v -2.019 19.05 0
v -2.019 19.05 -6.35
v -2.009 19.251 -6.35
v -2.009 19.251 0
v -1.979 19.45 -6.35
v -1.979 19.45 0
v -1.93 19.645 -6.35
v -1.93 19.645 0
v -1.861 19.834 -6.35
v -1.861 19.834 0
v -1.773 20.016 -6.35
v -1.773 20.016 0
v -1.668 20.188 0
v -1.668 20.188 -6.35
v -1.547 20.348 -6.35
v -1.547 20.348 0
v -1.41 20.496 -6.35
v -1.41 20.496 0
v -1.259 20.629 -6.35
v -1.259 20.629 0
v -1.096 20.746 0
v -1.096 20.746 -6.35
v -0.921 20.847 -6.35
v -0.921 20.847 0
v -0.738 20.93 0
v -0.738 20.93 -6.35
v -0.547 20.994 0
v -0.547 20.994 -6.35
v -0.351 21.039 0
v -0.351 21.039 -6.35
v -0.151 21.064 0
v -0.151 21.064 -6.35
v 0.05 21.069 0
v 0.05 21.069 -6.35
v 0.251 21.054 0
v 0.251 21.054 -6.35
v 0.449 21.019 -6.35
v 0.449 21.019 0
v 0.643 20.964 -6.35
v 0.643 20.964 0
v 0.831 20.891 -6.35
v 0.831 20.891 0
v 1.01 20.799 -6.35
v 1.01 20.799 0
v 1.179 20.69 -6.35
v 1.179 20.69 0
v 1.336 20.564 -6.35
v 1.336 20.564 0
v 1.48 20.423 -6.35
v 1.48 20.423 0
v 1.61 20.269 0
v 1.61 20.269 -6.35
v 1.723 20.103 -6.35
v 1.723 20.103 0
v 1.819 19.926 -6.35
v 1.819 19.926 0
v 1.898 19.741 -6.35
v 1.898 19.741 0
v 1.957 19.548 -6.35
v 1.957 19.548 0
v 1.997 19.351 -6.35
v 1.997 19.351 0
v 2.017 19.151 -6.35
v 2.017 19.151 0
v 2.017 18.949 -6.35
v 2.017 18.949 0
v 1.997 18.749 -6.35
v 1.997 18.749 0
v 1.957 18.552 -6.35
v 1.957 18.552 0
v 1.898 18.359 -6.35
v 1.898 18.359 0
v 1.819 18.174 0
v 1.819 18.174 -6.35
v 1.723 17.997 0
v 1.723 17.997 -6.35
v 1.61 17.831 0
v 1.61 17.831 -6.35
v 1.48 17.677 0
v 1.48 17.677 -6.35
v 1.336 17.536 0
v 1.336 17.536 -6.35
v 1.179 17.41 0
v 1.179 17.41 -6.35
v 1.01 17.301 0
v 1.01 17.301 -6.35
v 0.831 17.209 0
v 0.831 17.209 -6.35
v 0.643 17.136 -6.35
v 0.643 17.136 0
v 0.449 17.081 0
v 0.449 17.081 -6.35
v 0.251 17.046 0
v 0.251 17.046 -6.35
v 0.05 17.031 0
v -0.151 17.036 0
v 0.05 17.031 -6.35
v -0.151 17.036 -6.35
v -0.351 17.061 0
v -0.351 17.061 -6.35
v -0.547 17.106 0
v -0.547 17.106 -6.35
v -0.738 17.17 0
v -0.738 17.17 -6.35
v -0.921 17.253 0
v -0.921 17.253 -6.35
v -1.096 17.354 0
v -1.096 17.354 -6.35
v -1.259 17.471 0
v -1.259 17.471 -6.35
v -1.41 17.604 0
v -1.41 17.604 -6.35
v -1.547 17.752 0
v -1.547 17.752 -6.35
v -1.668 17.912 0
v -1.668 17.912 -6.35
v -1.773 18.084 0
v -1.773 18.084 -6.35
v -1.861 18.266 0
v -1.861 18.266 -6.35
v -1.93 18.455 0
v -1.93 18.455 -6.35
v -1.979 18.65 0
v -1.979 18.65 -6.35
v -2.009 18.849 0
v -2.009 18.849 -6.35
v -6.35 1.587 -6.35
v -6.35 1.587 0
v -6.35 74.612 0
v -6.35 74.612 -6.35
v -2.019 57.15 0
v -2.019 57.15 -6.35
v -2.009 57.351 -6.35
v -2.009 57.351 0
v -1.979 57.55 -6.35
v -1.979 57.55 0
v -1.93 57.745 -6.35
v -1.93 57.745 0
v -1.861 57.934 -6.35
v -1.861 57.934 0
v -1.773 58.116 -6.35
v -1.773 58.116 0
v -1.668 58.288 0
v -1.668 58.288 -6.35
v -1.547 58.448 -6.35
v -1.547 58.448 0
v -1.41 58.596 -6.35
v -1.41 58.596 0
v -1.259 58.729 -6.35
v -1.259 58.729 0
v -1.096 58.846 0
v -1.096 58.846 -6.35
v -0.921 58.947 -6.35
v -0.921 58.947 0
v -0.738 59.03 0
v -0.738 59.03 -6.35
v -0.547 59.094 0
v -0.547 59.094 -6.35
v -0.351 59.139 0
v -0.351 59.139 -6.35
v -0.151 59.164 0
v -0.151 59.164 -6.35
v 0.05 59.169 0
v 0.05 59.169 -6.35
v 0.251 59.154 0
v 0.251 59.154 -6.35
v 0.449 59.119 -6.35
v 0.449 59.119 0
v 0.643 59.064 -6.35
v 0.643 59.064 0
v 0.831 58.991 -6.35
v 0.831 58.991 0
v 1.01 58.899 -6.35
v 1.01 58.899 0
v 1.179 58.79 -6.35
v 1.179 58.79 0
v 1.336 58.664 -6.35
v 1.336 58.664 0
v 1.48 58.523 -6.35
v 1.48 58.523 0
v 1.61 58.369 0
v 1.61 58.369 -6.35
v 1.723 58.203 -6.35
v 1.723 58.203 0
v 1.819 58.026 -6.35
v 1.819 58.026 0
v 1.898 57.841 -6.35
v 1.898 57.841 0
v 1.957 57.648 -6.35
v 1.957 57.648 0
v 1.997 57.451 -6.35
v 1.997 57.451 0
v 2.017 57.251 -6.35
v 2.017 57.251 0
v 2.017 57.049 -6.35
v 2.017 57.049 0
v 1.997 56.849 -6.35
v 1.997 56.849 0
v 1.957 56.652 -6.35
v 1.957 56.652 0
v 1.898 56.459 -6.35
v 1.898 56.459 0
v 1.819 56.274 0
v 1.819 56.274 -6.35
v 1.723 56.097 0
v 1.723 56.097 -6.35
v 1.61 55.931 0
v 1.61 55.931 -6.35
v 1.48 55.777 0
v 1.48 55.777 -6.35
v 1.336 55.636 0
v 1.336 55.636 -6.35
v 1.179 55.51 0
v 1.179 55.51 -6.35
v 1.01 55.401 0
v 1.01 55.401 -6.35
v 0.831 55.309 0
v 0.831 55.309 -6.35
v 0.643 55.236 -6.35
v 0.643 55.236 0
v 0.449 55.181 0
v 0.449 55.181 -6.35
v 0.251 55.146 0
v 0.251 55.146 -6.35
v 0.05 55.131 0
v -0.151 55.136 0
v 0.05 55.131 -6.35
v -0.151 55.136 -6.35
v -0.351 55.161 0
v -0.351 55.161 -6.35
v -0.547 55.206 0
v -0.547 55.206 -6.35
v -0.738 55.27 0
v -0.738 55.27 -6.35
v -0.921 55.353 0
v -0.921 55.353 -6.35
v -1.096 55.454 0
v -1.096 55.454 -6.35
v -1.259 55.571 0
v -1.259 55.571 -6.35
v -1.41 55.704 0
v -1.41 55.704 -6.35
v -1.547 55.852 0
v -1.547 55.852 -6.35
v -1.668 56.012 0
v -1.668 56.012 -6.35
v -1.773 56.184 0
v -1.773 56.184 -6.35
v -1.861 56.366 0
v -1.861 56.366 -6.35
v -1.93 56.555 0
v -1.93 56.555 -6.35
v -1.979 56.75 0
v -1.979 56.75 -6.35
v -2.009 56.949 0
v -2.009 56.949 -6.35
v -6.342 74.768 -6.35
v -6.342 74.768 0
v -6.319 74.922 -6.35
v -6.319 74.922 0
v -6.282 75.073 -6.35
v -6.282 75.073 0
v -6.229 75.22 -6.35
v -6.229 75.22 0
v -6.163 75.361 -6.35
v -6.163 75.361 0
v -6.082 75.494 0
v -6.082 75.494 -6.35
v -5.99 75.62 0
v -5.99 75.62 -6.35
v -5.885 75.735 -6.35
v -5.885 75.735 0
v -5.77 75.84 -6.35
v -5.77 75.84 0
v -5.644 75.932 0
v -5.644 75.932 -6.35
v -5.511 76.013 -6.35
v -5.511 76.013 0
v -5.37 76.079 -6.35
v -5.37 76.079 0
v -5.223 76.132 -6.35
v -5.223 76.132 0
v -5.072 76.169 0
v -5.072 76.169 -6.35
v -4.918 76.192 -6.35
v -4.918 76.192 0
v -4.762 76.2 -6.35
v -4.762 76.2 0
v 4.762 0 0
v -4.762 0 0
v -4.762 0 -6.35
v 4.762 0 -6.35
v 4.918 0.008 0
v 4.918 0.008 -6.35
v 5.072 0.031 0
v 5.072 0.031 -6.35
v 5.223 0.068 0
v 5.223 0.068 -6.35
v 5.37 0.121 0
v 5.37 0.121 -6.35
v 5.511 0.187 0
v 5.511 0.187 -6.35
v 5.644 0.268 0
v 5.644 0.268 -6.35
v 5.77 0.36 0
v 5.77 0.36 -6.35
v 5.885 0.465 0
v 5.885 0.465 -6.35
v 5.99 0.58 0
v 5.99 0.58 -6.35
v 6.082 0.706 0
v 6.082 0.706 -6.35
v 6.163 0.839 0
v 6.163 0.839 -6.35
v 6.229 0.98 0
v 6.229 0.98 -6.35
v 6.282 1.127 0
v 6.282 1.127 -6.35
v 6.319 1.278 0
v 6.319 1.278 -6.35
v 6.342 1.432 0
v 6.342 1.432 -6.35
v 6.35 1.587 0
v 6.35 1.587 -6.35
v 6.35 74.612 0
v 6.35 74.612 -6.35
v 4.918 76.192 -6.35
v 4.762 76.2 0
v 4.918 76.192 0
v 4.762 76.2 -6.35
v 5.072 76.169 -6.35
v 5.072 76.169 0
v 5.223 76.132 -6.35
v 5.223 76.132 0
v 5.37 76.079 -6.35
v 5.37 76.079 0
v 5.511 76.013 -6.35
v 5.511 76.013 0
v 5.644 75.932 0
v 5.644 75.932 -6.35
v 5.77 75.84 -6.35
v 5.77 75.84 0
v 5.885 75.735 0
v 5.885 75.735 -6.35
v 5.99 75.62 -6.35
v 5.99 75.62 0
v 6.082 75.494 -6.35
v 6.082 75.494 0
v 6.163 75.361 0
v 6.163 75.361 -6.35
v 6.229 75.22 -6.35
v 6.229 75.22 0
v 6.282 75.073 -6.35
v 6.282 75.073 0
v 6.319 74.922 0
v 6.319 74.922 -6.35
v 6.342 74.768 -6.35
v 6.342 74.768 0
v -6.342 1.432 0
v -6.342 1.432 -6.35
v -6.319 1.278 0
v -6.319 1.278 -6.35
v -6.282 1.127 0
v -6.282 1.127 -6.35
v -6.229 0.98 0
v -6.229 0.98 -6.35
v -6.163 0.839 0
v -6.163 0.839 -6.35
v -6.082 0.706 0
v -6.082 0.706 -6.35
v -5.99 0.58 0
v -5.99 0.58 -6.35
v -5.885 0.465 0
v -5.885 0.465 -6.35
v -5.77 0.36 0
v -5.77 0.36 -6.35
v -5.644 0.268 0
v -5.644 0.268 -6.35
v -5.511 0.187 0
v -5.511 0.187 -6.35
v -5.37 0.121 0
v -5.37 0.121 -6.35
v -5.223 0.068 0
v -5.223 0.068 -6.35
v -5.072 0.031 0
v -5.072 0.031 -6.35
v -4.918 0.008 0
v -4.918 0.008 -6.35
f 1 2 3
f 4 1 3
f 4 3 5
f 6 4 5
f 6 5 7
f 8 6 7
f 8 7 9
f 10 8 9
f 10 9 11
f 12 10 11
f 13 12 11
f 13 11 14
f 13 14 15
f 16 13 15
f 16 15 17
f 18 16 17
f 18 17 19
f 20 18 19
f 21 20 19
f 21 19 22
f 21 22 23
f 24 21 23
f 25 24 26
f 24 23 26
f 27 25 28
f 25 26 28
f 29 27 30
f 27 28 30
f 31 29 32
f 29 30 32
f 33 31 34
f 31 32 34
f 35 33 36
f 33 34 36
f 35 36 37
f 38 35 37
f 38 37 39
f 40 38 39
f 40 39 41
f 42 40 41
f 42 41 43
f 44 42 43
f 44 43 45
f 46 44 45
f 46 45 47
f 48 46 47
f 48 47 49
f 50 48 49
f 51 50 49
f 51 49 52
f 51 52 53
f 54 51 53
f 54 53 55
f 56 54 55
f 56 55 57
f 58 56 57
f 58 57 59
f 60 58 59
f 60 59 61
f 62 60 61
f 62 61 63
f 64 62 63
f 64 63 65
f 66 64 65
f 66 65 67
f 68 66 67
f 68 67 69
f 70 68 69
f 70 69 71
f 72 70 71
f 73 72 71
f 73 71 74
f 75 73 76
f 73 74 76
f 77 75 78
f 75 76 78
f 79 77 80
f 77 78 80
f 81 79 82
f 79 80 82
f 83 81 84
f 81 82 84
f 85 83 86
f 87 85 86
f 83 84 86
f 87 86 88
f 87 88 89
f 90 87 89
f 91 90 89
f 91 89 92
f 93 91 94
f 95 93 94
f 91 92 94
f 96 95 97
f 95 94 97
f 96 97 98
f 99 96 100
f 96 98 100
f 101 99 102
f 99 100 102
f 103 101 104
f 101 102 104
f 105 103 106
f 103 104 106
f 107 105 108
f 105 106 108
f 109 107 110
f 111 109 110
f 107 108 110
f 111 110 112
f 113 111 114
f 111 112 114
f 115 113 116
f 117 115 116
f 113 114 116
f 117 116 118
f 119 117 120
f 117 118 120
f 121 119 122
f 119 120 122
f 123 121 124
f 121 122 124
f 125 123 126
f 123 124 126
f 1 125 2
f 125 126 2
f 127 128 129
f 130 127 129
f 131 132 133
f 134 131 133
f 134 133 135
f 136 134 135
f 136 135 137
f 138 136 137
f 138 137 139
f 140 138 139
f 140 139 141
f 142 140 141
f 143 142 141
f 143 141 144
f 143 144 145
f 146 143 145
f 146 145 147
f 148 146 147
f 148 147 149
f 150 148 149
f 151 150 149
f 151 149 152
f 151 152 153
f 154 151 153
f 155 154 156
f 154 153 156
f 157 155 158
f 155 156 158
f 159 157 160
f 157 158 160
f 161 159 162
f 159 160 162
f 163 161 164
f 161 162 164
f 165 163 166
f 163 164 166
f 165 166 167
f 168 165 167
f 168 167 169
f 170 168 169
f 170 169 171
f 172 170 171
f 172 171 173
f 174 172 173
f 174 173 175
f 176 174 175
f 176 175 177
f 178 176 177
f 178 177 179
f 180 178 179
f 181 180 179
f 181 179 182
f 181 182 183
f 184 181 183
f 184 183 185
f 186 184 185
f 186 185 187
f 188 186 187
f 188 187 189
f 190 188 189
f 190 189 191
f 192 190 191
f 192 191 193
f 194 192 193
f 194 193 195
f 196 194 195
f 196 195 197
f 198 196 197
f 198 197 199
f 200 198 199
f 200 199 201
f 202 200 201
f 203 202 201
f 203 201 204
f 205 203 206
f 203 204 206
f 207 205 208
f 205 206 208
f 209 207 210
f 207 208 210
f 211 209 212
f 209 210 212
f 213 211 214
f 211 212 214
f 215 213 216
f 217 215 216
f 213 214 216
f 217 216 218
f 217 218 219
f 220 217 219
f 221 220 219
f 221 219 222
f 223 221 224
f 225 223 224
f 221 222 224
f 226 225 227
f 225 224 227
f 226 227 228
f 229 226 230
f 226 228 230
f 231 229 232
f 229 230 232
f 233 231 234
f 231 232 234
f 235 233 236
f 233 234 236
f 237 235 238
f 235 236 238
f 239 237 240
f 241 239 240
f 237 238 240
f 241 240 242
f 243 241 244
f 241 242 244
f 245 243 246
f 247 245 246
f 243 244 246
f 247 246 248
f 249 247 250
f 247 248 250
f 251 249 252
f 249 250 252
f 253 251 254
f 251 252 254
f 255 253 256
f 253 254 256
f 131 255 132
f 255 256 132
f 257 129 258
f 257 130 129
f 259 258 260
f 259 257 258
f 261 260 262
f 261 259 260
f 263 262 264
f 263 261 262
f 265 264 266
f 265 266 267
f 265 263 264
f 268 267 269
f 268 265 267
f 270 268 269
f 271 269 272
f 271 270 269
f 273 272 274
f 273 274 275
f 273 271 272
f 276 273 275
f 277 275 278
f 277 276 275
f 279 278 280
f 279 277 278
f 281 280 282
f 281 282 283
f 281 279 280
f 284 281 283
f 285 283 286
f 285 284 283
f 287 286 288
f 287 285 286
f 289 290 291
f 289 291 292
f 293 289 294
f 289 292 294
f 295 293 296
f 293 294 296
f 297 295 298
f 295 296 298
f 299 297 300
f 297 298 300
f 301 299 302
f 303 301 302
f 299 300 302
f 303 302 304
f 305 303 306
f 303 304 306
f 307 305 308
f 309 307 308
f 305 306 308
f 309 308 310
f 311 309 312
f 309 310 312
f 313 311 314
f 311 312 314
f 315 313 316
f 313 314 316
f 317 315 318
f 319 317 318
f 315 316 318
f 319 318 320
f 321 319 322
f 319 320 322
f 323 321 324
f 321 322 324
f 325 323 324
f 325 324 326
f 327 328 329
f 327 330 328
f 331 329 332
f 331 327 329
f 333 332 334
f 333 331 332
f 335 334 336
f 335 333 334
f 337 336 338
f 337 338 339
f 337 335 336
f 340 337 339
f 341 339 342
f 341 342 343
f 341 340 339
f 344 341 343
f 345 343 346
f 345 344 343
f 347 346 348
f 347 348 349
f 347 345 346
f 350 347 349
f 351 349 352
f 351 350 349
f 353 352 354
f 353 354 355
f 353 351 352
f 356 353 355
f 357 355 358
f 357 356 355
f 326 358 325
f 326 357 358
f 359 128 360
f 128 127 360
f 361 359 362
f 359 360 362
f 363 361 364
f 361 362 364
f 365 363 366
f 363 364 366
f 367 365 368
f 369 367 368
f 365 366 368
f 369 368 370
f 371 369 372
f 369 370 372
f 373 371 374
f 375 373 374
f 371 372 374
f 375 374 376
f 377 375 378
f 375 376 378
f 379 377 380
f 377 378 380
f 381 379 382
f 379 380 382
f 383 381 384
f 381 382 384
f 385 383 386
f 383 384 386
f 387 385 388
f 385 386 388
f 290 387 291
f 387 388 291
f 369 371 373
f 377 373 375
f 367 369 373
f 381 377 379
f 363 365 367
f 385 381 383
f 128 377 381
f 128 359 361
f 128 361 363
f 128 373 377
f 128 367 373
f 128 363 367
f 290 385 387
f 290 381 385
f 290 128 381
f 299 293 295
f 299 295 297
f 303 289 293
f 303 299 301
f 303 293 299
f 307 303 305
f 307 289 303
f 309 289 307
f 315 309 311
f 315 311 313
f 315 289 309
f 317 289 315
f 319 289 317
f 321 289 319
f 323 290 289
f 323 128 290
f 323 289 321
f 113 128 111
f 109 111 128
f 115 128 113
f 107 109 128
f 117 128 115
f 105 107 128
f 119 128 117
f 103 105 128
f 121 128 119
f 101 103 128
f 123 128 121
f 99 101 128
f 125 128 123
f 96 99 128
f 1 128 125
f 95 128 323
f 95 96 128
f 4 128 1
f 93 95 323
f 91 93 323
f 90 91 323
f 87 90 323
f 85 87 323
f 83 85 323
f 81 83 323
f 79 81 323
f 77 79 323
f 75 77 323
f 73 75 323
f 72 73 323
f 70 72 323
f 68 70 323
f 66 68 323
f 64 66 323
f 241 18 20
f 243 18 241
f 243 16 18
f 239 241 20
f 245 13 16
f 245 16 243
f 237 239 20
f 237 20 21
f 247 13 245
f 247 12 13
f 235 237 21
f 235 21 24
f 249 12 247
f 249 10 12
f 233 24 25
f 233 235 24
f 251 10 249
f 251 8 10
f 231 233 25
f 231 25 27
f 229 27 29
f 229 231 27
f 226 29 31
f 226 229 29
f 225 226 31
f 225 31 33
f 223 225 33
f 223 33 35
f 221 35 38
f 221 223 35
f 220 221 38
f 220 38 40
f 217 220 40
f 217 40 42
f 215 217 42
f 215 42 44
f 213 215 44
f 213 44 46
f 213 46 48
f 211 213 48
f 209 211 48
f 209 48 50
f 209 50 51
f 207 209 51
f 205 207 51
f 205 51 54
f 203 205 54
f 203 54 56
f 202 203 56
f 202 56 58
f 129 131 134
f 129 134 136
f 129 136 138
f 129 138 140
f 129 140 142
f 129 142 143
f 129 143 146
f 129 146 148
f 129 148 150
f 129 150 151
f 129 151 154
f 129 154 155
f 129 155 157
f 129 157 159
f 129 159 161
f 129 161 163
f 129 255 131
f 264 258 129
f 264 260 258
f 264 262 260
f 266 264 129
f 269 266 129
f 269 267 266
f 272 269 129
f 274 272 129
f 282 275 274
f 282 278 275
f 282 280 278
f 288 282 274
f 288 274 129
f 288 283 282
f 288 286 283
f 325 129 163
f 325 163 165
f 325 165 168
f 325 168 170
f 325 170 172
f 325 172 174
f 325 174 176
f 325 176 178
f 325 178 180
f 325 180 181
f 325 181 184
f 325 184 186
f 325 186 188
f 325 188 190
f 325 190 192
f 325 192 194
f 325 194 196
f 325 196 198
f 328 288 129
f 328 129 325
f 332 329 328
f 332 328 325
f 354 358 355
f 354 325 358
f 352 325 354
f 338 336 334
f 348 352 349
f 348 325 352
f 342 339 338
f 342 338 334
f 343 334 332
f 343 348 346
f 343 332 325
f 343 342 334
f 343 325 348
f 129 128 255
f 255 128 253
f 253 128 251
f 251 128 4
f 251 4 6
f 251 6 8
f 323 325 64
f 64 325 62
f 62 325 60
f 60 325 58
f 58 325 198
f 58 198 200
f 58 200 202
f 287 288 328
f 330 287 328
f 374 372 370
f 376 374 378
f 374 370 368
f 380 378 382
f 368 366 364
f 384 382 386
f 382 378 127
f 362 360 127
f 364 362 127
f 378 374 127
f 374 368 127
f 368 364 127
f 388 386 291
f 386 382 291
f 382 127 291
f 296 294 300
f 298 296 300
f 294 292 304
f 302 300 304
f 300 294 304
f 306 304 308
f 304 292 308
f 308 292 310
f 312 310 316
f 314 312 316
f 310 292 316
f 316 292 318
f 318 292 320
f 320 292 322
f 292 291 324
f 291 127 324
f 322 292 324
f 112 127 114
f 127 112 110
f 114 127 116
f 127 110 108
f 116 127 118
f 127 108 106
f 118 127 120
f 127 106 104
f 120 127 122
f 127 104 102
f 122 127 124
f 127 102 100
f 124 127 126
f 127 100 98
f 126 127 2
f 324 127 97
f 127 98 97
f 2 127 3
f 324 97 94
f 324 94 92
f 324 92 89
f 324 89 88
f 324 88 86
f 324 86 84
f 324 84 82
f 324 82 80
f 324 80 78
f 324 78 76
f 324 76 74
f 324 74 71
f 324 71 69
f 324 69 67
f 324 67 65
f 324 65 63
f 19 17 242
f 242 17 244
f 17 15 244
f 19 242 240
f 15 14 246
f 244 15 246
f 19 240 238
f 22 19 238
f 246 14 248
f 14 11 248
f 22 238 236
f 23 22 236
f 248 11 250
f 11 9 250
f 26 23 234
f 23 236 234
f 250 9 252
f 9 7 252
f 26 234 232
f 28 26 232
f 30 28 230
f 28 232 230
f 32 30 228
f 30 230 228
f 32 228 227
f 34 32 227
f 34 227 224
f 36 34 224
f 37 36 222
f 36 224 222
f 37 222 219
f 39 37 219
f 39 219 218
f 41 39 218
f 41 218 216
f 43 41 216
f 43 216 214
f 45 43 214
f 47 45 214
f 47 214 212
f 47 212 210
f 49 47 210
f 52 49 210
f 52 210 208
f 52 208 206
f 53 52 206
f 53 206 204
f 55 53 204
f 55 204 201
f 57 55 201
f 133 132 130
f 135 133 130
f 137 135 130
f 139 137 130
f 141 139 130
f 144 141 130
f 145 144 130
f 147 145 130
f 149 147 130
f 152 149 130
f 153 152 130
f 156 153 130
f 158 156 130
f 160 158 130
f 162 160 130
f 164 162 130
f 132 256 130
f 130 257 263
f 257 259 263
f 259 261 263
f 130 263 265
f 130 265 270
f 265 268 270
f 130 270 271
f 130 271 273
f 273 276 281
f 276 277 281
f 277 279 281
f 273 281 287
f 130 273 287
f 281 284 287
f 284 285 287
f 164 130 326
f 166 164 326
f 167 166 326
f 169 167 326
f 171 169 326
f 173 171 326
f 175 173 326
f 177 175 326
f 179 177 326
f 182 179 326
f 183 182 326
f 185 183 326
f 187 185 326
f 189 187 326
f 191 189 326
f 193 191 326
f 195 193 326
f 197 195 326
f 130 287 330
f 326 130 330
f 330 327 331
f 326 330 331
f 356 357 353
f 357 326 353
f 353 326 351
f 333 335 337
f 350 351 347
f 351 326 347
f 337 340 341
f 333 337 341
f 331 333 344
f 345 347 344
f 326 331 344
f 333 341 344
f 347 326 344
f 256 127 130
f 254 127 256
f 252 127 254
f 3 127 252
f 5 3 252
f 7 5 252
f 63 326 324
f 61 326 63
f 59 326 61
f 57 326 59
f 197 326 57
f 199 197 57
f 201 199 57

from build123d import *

# Parameters (mm, degrees)
SKETCH1_W                  = 12.7
SKETCH1_H                  = 76.2
EXTRUDE1_DEPTH             = 6.35
F_10_32_TAPPED_HOLE1_D     = 4.0386
F_10_32_TAPPED_HOLE1_DEPTH = 13.716
F_10_32_TAPPED_HOLE1_TIP   = 1.213317848
FILLET1_R                  = 1.5875


with BuildPart() as part:
    # Sketch1 → Extrude1 (new body)
    with BuildSketch(Plane.XY):
        with Locations((0, 38.1)):
            Rectangle(SKETCH1_W, SKETCH1_H)
    extrude(amount=-EXTRUDE1_DEPTH)

    # #10-32 Tapped Hole1
    with Locations(Plane.XY):
        with Locations((0, 57.15), (0, 19.05)):
            Hole(F_10_32_TAPPED_HOLE1_D / 2, depth=F_10_32_TAPPED_HOLE1_DEPTH)
            with Locations((0, 0, -(F_10_32_TAPPED_HOLE1_DEPTH + F_10_32_TAPPED_HOLE1_TIP / 2))):  # 118° drill point
                Cone(0, F_10_32_TAPPED_HOLE1_D / 2, F_10_32_TAPPED_HOLE1_TIP, mode=Mode.SUBTRACT)

    # Fillet1
    fillet1_edges = [part.edges().sort_by_distance(p)[0] for p in [
        (-6.35, 76.2, -3.175),
        (6.35, 76.2, -3.175),
        (6.35, 0, -3.175),
        (-6.35, 0, -3.175),
    ]]
    fillet(fillet1_edges, radius=FILLET1_R)


solid = part.part
